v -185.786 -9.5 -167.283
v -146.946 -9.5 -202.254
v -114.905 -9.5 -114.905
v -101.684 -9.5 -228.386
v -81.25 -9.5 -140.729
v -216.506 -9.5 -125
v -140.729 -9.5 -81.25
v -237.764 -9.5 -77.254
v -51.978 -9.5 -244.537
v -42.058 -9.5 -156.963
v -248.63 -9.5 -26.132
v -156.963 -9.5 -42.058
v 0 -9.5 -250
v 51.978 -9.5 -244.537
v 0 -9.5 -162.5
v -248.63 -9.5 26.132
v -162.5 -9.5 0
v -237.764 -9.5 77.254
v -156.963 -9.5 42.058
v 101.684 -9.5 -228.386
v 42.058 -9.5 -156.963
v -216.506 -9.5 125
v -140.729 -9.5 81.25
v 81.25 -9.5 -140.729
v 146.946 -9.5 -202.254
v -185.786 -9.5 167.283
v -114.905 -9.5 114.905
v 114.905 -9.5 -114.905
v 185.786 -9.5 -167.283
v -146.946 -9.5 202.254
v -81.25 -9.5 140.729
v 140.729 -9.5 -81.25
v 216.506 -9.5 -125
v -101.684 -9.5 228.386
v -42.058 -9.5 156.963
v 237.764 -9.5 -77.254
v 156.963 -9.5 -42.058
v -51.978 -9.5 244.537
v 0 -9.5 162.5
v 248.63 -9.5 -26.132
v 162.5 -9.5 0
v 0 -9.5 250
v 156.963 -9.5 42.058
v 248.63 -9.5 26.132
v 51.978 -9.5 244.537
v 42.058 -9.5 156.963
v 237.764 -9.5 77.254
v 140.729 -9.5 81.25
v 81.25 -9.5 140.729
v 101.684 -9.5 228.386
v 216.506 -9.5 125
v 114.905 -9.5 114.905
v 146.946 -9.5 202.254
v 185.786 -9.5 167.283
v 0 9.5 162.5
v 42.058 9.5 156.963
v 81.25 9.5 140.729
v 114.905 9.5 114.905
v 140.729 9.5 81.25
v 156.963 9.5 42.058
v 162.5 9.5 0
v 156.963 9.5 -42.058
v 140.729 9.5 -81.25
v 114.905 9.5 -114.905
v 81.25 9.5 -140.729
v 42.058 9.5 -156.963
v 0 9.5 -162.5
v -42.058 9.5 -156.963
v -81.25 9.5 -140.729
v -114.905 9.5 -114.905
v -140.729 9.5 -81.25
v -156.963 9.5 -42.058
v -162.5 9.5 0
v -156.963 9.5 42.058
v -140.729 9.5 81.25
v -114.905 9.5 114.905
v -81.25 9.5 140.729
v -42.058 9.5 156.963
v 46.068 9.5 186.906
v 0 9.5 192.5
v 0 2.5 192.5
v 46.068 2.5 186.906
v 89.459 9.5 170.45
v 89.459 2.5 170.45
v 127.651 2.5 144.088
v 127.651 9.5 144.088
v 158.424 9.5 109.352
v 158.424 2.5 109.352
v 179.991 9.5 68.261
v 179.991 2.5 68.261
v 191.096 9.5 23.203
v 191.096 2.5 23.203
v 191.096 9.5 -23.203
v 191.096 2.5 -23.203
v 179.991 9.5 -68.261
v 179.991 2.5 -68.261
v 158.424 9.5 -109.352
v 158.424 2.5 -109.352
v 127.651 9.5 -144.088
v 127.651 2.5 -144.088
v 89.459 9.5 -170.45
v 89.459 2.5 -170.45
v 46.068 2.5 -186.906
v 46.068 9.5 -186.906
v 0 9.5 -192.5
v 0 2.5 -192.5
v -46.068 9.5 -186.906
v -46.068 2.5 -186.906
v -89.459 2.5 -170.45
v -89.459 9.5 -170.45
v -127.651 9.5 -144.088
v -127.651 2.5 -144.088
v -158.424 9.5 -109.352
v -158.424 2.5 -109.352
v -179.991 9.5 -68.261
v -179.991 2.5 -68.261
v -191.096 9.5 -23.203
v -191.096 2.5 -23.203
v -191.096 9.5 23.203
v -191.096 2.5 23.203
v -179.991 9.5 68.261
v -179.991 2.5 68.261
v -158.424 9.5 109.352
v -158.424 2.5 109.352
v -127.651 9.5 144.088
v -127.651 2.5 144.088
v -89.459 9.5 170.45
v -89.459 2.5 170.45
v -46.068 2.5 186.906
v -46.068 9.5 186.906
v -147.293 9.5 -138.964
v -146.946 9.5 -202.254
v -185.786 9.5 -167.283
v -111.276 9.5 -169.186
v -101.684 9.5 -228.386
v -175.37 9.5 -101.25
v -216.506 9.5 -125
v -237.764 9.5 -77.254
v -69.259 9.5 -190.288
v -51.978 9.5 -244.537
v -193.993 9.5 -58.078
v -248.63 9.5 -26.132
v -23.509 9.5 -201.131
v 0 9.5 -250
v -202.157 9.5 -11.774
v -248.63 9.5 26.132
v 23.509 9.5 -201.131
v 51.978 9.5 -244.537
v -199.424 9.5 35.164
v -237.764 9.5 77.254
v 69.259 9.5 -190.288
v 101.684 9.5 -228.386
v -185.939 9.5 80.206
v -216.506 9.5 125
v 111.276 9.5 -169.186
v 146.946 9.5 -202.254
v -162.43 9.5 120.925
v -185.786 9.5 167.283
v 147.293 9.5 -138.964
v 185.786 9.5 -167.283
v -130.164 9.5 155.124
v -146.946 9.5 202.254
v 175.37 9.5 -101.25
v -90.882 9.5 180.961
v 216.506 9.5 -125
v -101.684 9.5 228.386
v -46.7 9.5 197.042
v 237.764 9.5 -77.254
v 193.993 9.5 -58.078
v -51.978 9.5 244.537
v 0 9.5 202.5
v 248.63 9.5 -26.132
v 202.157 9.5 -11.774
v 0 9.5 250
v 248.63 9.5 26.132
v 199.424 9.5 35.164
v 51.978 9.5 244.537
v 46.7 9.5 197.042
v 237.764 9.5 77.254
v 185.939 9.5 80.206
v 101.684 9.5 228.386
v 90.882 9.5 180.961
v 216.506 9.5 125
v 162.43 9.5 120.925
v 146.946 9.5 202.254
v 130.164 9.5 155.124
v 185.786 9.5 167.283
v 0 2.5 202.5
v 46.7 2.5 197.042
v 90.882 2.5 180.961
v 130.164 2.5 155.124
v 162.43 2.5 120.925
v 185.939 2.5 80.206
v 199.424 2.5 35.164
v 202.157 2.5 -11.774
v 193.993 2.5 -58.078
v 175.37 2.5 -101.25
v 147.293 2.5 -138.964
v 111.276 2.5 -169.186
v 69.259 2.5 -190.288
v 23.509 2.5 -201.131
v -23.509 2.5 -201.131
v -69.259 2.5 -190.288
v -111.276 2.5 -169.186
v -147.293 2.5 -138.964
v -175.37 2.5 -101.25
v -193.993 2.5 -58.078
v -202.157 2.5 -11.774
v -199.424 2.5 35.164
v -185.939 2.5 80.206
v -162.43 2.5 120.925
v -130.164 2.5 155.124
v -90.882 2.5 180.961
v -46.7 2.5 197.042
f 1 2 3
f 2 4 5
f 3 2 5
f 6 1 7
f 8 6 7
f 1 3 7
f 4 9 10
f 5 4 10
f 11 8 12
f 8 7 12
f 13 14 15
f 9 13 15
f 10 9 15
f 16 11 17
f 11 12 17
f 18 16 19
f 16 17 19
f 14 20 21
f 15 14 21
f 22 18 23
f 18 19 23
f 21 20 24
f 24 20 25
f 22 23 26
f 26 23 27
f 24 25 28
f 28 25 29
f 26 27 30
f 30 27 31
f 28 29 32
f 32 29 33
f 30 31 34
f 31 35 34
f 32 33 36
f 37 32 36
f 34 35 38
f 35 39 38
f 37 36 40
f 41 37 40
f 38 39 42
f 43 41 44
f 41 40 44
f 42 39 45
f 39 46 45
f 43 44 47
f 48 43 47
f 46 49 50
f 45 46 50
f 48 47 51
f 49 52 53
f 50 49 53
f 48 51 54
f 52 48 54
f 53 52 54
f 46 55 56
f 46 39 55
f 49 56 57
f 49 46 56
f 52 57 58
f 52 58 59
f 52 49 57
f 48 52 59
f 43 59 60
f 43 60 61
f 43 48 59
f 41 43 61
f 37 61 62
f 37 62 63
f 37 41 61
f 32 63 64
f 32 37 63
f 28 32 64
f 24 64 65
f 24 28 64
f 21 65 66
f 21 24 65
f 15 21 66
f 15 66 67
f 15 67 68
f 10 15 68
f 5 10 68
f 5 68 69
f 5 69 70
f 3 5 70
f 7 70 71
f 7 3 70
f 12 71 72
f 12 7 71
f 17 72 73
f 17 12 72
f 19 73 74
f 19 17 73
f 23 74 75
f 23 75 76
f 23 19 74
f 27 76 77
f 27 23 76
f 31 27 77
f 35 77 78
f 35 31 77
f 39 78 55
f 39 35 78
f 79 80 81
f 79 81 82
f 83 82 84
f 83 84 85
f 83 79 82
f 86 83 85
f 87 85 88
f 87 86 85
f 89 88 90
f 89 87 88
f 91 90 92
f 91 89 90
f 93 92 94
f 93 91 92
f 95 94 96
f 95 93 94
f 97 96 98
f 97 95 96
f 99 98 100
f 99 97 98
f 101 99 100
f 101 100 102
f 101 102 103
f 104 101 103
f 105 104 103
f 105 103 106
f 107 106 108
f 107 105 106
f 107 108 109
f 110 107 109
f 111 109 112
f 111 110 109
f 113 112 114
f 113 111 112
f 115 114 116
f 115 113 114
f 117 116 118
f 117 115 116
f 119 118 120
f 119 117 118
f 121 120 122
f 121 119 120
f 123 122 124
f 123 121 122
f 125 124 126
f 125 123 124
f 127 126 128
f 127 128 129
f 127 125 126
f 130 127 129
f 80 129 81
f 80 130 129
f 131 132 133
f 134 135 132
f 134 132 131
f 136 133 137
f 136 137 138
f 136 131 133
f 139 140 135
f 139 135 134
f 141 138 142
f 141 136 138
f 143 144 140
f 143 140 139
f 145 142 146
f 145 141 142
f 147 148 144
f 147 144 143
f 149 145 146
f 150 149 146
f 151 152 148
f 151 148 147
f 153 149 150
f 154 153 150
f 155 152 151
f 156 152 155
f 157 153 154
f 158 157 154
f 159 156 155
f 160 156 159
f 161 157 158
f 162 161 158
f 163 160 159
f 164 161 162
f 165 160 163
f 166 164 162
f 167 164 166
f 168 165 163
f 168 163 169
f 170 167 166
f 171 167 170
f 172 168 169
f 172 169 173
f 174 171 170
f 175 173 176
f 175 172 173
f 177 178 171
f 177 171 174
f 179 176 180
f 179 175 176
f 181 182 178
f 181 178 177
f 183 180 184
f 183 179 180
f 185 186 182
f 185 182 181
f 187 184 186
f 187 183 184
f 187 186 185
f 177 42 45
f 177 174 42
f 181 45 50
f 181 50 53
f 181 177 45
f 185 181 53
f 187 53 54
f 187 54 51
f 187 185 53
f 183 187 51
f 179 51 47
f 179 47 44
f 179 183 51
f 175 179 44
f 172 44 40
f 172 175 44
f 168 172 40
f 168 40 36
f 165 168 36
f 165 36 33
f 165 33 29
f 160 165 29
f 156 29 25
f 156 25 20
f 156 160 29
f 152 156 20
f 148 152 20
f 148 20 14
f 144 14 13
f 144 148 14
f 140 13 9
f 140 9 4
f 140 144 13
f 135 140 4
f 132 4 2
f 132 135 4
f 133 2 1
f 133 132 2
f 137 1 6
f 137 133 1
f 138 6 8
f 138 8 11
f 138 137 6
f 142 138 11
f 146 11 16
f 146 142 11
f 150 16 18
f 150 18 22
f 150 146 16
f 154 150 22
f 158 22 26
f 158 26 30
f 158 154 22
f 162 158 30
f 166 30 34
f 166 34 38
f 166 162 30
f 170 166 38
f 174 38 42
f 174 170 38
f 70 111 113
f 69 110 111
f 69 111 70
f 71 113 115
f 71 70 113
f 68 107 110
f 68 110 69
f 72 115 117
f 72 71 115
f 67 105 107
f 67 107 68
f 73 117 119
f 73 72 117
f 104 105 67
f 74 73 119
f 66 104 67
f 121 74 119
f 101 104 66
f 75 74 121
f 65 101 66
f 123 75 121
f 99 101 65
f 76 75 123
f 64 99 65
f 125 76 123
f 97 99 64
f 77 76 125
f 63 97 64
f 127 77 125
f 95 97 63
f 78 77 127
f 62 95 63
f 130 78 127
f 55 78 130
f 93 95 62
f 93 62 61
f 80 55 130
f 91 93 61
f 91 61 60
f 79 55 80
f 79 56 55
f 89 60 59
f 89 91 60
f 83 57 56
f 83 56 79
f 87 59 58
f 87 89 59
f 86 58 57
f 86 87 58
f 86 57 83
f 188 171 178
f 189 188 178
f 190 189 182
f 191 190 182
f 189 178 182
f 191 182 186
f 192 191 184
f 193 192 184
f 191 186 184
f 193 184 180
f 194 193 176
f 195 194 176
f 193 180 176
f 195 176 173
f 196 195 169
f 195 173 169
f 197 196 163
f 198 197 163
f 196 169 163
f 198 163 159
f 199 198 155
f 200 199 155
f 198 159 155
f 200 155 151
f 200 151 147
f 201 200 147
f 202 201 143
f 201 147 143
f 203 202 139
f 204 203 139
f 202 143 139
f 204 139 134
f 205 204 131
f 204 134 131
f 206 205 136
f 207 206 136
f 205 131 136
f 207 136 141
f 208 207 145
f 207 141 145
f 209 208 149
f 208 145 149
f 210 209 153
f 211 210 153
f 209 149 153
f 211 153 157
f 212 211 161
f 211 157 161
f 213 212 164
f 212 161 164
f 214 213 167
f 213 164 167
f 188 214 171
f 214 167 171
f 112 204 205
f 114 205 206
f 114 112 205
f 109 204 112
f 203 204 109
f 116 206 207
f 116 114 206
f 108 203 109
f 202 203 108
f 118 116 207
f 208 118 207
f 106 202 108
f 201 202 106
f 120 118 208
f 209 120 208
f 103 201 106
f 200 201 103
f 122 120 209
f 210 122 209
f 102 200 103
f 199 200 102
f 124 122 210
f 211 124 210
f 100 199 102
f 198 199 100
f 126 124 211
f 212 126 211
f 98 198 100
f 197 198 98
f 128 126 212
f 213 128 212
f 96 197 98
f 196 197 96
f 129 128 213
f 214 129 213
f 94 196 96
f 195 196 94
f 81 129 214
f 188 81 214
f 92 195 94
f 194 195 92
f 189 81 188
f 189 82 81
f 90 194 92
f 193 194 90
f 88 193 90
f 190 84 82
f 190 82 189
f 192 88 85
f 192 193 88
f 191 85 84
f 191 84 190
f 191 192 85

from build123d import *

# Parameters (mm, degrees)
SKETCH1_R           = 250
SKETCH1_R_2         = 162.5
BOSS_EXTRUDE1_DEPTH = 9.5
SKETCH2_R           = 202.5
SKETCH2_R_2         = 192.5
CUT_EXTRUDE1_DEPTH  = 7


with BuildPart() as part:
    # Sketch1 → Boss-Extrude1 (new, symmetric)
    with BuildSketch(Plane(origin=(0, 0, 0), x_dir=(1, 0, 0), z_dir=(0, 1, 0))):
        with Locations(Location((0, 0, 0), (0, 0, 270))):
            Circle(SKETCH1_R)
        with Locations(Location((0, 0, 0), (0, 0, 270))):
            Circle(SKETCH1_R_2, mode=Mode.SUBTRACT)
    extrude(amount=BOSS_EXTRUDE1_DEPTH, both=True)

    # Sketch2 → Cut-Extrude1 (cut)
    with BuildSketch(Plane(origin=(0, 9.5, 0), x_dir=(1, 0, 0), z_dir=(0, 1, 0))):
        with Locations(Location((0, 0, 0), (0, 0, 270))):
            Circle(SKETCH2_R)
        with Locations(Location((0, 0, 0), (0, 0, 270))):
            Circle(SKETCH2_R_2, mode=Mode.SUBTRACT)
    extrude(amount=-CUT_EXTRUDE1_DEPTH, mode=Mode.SUBTRACT)


solid = part.part
